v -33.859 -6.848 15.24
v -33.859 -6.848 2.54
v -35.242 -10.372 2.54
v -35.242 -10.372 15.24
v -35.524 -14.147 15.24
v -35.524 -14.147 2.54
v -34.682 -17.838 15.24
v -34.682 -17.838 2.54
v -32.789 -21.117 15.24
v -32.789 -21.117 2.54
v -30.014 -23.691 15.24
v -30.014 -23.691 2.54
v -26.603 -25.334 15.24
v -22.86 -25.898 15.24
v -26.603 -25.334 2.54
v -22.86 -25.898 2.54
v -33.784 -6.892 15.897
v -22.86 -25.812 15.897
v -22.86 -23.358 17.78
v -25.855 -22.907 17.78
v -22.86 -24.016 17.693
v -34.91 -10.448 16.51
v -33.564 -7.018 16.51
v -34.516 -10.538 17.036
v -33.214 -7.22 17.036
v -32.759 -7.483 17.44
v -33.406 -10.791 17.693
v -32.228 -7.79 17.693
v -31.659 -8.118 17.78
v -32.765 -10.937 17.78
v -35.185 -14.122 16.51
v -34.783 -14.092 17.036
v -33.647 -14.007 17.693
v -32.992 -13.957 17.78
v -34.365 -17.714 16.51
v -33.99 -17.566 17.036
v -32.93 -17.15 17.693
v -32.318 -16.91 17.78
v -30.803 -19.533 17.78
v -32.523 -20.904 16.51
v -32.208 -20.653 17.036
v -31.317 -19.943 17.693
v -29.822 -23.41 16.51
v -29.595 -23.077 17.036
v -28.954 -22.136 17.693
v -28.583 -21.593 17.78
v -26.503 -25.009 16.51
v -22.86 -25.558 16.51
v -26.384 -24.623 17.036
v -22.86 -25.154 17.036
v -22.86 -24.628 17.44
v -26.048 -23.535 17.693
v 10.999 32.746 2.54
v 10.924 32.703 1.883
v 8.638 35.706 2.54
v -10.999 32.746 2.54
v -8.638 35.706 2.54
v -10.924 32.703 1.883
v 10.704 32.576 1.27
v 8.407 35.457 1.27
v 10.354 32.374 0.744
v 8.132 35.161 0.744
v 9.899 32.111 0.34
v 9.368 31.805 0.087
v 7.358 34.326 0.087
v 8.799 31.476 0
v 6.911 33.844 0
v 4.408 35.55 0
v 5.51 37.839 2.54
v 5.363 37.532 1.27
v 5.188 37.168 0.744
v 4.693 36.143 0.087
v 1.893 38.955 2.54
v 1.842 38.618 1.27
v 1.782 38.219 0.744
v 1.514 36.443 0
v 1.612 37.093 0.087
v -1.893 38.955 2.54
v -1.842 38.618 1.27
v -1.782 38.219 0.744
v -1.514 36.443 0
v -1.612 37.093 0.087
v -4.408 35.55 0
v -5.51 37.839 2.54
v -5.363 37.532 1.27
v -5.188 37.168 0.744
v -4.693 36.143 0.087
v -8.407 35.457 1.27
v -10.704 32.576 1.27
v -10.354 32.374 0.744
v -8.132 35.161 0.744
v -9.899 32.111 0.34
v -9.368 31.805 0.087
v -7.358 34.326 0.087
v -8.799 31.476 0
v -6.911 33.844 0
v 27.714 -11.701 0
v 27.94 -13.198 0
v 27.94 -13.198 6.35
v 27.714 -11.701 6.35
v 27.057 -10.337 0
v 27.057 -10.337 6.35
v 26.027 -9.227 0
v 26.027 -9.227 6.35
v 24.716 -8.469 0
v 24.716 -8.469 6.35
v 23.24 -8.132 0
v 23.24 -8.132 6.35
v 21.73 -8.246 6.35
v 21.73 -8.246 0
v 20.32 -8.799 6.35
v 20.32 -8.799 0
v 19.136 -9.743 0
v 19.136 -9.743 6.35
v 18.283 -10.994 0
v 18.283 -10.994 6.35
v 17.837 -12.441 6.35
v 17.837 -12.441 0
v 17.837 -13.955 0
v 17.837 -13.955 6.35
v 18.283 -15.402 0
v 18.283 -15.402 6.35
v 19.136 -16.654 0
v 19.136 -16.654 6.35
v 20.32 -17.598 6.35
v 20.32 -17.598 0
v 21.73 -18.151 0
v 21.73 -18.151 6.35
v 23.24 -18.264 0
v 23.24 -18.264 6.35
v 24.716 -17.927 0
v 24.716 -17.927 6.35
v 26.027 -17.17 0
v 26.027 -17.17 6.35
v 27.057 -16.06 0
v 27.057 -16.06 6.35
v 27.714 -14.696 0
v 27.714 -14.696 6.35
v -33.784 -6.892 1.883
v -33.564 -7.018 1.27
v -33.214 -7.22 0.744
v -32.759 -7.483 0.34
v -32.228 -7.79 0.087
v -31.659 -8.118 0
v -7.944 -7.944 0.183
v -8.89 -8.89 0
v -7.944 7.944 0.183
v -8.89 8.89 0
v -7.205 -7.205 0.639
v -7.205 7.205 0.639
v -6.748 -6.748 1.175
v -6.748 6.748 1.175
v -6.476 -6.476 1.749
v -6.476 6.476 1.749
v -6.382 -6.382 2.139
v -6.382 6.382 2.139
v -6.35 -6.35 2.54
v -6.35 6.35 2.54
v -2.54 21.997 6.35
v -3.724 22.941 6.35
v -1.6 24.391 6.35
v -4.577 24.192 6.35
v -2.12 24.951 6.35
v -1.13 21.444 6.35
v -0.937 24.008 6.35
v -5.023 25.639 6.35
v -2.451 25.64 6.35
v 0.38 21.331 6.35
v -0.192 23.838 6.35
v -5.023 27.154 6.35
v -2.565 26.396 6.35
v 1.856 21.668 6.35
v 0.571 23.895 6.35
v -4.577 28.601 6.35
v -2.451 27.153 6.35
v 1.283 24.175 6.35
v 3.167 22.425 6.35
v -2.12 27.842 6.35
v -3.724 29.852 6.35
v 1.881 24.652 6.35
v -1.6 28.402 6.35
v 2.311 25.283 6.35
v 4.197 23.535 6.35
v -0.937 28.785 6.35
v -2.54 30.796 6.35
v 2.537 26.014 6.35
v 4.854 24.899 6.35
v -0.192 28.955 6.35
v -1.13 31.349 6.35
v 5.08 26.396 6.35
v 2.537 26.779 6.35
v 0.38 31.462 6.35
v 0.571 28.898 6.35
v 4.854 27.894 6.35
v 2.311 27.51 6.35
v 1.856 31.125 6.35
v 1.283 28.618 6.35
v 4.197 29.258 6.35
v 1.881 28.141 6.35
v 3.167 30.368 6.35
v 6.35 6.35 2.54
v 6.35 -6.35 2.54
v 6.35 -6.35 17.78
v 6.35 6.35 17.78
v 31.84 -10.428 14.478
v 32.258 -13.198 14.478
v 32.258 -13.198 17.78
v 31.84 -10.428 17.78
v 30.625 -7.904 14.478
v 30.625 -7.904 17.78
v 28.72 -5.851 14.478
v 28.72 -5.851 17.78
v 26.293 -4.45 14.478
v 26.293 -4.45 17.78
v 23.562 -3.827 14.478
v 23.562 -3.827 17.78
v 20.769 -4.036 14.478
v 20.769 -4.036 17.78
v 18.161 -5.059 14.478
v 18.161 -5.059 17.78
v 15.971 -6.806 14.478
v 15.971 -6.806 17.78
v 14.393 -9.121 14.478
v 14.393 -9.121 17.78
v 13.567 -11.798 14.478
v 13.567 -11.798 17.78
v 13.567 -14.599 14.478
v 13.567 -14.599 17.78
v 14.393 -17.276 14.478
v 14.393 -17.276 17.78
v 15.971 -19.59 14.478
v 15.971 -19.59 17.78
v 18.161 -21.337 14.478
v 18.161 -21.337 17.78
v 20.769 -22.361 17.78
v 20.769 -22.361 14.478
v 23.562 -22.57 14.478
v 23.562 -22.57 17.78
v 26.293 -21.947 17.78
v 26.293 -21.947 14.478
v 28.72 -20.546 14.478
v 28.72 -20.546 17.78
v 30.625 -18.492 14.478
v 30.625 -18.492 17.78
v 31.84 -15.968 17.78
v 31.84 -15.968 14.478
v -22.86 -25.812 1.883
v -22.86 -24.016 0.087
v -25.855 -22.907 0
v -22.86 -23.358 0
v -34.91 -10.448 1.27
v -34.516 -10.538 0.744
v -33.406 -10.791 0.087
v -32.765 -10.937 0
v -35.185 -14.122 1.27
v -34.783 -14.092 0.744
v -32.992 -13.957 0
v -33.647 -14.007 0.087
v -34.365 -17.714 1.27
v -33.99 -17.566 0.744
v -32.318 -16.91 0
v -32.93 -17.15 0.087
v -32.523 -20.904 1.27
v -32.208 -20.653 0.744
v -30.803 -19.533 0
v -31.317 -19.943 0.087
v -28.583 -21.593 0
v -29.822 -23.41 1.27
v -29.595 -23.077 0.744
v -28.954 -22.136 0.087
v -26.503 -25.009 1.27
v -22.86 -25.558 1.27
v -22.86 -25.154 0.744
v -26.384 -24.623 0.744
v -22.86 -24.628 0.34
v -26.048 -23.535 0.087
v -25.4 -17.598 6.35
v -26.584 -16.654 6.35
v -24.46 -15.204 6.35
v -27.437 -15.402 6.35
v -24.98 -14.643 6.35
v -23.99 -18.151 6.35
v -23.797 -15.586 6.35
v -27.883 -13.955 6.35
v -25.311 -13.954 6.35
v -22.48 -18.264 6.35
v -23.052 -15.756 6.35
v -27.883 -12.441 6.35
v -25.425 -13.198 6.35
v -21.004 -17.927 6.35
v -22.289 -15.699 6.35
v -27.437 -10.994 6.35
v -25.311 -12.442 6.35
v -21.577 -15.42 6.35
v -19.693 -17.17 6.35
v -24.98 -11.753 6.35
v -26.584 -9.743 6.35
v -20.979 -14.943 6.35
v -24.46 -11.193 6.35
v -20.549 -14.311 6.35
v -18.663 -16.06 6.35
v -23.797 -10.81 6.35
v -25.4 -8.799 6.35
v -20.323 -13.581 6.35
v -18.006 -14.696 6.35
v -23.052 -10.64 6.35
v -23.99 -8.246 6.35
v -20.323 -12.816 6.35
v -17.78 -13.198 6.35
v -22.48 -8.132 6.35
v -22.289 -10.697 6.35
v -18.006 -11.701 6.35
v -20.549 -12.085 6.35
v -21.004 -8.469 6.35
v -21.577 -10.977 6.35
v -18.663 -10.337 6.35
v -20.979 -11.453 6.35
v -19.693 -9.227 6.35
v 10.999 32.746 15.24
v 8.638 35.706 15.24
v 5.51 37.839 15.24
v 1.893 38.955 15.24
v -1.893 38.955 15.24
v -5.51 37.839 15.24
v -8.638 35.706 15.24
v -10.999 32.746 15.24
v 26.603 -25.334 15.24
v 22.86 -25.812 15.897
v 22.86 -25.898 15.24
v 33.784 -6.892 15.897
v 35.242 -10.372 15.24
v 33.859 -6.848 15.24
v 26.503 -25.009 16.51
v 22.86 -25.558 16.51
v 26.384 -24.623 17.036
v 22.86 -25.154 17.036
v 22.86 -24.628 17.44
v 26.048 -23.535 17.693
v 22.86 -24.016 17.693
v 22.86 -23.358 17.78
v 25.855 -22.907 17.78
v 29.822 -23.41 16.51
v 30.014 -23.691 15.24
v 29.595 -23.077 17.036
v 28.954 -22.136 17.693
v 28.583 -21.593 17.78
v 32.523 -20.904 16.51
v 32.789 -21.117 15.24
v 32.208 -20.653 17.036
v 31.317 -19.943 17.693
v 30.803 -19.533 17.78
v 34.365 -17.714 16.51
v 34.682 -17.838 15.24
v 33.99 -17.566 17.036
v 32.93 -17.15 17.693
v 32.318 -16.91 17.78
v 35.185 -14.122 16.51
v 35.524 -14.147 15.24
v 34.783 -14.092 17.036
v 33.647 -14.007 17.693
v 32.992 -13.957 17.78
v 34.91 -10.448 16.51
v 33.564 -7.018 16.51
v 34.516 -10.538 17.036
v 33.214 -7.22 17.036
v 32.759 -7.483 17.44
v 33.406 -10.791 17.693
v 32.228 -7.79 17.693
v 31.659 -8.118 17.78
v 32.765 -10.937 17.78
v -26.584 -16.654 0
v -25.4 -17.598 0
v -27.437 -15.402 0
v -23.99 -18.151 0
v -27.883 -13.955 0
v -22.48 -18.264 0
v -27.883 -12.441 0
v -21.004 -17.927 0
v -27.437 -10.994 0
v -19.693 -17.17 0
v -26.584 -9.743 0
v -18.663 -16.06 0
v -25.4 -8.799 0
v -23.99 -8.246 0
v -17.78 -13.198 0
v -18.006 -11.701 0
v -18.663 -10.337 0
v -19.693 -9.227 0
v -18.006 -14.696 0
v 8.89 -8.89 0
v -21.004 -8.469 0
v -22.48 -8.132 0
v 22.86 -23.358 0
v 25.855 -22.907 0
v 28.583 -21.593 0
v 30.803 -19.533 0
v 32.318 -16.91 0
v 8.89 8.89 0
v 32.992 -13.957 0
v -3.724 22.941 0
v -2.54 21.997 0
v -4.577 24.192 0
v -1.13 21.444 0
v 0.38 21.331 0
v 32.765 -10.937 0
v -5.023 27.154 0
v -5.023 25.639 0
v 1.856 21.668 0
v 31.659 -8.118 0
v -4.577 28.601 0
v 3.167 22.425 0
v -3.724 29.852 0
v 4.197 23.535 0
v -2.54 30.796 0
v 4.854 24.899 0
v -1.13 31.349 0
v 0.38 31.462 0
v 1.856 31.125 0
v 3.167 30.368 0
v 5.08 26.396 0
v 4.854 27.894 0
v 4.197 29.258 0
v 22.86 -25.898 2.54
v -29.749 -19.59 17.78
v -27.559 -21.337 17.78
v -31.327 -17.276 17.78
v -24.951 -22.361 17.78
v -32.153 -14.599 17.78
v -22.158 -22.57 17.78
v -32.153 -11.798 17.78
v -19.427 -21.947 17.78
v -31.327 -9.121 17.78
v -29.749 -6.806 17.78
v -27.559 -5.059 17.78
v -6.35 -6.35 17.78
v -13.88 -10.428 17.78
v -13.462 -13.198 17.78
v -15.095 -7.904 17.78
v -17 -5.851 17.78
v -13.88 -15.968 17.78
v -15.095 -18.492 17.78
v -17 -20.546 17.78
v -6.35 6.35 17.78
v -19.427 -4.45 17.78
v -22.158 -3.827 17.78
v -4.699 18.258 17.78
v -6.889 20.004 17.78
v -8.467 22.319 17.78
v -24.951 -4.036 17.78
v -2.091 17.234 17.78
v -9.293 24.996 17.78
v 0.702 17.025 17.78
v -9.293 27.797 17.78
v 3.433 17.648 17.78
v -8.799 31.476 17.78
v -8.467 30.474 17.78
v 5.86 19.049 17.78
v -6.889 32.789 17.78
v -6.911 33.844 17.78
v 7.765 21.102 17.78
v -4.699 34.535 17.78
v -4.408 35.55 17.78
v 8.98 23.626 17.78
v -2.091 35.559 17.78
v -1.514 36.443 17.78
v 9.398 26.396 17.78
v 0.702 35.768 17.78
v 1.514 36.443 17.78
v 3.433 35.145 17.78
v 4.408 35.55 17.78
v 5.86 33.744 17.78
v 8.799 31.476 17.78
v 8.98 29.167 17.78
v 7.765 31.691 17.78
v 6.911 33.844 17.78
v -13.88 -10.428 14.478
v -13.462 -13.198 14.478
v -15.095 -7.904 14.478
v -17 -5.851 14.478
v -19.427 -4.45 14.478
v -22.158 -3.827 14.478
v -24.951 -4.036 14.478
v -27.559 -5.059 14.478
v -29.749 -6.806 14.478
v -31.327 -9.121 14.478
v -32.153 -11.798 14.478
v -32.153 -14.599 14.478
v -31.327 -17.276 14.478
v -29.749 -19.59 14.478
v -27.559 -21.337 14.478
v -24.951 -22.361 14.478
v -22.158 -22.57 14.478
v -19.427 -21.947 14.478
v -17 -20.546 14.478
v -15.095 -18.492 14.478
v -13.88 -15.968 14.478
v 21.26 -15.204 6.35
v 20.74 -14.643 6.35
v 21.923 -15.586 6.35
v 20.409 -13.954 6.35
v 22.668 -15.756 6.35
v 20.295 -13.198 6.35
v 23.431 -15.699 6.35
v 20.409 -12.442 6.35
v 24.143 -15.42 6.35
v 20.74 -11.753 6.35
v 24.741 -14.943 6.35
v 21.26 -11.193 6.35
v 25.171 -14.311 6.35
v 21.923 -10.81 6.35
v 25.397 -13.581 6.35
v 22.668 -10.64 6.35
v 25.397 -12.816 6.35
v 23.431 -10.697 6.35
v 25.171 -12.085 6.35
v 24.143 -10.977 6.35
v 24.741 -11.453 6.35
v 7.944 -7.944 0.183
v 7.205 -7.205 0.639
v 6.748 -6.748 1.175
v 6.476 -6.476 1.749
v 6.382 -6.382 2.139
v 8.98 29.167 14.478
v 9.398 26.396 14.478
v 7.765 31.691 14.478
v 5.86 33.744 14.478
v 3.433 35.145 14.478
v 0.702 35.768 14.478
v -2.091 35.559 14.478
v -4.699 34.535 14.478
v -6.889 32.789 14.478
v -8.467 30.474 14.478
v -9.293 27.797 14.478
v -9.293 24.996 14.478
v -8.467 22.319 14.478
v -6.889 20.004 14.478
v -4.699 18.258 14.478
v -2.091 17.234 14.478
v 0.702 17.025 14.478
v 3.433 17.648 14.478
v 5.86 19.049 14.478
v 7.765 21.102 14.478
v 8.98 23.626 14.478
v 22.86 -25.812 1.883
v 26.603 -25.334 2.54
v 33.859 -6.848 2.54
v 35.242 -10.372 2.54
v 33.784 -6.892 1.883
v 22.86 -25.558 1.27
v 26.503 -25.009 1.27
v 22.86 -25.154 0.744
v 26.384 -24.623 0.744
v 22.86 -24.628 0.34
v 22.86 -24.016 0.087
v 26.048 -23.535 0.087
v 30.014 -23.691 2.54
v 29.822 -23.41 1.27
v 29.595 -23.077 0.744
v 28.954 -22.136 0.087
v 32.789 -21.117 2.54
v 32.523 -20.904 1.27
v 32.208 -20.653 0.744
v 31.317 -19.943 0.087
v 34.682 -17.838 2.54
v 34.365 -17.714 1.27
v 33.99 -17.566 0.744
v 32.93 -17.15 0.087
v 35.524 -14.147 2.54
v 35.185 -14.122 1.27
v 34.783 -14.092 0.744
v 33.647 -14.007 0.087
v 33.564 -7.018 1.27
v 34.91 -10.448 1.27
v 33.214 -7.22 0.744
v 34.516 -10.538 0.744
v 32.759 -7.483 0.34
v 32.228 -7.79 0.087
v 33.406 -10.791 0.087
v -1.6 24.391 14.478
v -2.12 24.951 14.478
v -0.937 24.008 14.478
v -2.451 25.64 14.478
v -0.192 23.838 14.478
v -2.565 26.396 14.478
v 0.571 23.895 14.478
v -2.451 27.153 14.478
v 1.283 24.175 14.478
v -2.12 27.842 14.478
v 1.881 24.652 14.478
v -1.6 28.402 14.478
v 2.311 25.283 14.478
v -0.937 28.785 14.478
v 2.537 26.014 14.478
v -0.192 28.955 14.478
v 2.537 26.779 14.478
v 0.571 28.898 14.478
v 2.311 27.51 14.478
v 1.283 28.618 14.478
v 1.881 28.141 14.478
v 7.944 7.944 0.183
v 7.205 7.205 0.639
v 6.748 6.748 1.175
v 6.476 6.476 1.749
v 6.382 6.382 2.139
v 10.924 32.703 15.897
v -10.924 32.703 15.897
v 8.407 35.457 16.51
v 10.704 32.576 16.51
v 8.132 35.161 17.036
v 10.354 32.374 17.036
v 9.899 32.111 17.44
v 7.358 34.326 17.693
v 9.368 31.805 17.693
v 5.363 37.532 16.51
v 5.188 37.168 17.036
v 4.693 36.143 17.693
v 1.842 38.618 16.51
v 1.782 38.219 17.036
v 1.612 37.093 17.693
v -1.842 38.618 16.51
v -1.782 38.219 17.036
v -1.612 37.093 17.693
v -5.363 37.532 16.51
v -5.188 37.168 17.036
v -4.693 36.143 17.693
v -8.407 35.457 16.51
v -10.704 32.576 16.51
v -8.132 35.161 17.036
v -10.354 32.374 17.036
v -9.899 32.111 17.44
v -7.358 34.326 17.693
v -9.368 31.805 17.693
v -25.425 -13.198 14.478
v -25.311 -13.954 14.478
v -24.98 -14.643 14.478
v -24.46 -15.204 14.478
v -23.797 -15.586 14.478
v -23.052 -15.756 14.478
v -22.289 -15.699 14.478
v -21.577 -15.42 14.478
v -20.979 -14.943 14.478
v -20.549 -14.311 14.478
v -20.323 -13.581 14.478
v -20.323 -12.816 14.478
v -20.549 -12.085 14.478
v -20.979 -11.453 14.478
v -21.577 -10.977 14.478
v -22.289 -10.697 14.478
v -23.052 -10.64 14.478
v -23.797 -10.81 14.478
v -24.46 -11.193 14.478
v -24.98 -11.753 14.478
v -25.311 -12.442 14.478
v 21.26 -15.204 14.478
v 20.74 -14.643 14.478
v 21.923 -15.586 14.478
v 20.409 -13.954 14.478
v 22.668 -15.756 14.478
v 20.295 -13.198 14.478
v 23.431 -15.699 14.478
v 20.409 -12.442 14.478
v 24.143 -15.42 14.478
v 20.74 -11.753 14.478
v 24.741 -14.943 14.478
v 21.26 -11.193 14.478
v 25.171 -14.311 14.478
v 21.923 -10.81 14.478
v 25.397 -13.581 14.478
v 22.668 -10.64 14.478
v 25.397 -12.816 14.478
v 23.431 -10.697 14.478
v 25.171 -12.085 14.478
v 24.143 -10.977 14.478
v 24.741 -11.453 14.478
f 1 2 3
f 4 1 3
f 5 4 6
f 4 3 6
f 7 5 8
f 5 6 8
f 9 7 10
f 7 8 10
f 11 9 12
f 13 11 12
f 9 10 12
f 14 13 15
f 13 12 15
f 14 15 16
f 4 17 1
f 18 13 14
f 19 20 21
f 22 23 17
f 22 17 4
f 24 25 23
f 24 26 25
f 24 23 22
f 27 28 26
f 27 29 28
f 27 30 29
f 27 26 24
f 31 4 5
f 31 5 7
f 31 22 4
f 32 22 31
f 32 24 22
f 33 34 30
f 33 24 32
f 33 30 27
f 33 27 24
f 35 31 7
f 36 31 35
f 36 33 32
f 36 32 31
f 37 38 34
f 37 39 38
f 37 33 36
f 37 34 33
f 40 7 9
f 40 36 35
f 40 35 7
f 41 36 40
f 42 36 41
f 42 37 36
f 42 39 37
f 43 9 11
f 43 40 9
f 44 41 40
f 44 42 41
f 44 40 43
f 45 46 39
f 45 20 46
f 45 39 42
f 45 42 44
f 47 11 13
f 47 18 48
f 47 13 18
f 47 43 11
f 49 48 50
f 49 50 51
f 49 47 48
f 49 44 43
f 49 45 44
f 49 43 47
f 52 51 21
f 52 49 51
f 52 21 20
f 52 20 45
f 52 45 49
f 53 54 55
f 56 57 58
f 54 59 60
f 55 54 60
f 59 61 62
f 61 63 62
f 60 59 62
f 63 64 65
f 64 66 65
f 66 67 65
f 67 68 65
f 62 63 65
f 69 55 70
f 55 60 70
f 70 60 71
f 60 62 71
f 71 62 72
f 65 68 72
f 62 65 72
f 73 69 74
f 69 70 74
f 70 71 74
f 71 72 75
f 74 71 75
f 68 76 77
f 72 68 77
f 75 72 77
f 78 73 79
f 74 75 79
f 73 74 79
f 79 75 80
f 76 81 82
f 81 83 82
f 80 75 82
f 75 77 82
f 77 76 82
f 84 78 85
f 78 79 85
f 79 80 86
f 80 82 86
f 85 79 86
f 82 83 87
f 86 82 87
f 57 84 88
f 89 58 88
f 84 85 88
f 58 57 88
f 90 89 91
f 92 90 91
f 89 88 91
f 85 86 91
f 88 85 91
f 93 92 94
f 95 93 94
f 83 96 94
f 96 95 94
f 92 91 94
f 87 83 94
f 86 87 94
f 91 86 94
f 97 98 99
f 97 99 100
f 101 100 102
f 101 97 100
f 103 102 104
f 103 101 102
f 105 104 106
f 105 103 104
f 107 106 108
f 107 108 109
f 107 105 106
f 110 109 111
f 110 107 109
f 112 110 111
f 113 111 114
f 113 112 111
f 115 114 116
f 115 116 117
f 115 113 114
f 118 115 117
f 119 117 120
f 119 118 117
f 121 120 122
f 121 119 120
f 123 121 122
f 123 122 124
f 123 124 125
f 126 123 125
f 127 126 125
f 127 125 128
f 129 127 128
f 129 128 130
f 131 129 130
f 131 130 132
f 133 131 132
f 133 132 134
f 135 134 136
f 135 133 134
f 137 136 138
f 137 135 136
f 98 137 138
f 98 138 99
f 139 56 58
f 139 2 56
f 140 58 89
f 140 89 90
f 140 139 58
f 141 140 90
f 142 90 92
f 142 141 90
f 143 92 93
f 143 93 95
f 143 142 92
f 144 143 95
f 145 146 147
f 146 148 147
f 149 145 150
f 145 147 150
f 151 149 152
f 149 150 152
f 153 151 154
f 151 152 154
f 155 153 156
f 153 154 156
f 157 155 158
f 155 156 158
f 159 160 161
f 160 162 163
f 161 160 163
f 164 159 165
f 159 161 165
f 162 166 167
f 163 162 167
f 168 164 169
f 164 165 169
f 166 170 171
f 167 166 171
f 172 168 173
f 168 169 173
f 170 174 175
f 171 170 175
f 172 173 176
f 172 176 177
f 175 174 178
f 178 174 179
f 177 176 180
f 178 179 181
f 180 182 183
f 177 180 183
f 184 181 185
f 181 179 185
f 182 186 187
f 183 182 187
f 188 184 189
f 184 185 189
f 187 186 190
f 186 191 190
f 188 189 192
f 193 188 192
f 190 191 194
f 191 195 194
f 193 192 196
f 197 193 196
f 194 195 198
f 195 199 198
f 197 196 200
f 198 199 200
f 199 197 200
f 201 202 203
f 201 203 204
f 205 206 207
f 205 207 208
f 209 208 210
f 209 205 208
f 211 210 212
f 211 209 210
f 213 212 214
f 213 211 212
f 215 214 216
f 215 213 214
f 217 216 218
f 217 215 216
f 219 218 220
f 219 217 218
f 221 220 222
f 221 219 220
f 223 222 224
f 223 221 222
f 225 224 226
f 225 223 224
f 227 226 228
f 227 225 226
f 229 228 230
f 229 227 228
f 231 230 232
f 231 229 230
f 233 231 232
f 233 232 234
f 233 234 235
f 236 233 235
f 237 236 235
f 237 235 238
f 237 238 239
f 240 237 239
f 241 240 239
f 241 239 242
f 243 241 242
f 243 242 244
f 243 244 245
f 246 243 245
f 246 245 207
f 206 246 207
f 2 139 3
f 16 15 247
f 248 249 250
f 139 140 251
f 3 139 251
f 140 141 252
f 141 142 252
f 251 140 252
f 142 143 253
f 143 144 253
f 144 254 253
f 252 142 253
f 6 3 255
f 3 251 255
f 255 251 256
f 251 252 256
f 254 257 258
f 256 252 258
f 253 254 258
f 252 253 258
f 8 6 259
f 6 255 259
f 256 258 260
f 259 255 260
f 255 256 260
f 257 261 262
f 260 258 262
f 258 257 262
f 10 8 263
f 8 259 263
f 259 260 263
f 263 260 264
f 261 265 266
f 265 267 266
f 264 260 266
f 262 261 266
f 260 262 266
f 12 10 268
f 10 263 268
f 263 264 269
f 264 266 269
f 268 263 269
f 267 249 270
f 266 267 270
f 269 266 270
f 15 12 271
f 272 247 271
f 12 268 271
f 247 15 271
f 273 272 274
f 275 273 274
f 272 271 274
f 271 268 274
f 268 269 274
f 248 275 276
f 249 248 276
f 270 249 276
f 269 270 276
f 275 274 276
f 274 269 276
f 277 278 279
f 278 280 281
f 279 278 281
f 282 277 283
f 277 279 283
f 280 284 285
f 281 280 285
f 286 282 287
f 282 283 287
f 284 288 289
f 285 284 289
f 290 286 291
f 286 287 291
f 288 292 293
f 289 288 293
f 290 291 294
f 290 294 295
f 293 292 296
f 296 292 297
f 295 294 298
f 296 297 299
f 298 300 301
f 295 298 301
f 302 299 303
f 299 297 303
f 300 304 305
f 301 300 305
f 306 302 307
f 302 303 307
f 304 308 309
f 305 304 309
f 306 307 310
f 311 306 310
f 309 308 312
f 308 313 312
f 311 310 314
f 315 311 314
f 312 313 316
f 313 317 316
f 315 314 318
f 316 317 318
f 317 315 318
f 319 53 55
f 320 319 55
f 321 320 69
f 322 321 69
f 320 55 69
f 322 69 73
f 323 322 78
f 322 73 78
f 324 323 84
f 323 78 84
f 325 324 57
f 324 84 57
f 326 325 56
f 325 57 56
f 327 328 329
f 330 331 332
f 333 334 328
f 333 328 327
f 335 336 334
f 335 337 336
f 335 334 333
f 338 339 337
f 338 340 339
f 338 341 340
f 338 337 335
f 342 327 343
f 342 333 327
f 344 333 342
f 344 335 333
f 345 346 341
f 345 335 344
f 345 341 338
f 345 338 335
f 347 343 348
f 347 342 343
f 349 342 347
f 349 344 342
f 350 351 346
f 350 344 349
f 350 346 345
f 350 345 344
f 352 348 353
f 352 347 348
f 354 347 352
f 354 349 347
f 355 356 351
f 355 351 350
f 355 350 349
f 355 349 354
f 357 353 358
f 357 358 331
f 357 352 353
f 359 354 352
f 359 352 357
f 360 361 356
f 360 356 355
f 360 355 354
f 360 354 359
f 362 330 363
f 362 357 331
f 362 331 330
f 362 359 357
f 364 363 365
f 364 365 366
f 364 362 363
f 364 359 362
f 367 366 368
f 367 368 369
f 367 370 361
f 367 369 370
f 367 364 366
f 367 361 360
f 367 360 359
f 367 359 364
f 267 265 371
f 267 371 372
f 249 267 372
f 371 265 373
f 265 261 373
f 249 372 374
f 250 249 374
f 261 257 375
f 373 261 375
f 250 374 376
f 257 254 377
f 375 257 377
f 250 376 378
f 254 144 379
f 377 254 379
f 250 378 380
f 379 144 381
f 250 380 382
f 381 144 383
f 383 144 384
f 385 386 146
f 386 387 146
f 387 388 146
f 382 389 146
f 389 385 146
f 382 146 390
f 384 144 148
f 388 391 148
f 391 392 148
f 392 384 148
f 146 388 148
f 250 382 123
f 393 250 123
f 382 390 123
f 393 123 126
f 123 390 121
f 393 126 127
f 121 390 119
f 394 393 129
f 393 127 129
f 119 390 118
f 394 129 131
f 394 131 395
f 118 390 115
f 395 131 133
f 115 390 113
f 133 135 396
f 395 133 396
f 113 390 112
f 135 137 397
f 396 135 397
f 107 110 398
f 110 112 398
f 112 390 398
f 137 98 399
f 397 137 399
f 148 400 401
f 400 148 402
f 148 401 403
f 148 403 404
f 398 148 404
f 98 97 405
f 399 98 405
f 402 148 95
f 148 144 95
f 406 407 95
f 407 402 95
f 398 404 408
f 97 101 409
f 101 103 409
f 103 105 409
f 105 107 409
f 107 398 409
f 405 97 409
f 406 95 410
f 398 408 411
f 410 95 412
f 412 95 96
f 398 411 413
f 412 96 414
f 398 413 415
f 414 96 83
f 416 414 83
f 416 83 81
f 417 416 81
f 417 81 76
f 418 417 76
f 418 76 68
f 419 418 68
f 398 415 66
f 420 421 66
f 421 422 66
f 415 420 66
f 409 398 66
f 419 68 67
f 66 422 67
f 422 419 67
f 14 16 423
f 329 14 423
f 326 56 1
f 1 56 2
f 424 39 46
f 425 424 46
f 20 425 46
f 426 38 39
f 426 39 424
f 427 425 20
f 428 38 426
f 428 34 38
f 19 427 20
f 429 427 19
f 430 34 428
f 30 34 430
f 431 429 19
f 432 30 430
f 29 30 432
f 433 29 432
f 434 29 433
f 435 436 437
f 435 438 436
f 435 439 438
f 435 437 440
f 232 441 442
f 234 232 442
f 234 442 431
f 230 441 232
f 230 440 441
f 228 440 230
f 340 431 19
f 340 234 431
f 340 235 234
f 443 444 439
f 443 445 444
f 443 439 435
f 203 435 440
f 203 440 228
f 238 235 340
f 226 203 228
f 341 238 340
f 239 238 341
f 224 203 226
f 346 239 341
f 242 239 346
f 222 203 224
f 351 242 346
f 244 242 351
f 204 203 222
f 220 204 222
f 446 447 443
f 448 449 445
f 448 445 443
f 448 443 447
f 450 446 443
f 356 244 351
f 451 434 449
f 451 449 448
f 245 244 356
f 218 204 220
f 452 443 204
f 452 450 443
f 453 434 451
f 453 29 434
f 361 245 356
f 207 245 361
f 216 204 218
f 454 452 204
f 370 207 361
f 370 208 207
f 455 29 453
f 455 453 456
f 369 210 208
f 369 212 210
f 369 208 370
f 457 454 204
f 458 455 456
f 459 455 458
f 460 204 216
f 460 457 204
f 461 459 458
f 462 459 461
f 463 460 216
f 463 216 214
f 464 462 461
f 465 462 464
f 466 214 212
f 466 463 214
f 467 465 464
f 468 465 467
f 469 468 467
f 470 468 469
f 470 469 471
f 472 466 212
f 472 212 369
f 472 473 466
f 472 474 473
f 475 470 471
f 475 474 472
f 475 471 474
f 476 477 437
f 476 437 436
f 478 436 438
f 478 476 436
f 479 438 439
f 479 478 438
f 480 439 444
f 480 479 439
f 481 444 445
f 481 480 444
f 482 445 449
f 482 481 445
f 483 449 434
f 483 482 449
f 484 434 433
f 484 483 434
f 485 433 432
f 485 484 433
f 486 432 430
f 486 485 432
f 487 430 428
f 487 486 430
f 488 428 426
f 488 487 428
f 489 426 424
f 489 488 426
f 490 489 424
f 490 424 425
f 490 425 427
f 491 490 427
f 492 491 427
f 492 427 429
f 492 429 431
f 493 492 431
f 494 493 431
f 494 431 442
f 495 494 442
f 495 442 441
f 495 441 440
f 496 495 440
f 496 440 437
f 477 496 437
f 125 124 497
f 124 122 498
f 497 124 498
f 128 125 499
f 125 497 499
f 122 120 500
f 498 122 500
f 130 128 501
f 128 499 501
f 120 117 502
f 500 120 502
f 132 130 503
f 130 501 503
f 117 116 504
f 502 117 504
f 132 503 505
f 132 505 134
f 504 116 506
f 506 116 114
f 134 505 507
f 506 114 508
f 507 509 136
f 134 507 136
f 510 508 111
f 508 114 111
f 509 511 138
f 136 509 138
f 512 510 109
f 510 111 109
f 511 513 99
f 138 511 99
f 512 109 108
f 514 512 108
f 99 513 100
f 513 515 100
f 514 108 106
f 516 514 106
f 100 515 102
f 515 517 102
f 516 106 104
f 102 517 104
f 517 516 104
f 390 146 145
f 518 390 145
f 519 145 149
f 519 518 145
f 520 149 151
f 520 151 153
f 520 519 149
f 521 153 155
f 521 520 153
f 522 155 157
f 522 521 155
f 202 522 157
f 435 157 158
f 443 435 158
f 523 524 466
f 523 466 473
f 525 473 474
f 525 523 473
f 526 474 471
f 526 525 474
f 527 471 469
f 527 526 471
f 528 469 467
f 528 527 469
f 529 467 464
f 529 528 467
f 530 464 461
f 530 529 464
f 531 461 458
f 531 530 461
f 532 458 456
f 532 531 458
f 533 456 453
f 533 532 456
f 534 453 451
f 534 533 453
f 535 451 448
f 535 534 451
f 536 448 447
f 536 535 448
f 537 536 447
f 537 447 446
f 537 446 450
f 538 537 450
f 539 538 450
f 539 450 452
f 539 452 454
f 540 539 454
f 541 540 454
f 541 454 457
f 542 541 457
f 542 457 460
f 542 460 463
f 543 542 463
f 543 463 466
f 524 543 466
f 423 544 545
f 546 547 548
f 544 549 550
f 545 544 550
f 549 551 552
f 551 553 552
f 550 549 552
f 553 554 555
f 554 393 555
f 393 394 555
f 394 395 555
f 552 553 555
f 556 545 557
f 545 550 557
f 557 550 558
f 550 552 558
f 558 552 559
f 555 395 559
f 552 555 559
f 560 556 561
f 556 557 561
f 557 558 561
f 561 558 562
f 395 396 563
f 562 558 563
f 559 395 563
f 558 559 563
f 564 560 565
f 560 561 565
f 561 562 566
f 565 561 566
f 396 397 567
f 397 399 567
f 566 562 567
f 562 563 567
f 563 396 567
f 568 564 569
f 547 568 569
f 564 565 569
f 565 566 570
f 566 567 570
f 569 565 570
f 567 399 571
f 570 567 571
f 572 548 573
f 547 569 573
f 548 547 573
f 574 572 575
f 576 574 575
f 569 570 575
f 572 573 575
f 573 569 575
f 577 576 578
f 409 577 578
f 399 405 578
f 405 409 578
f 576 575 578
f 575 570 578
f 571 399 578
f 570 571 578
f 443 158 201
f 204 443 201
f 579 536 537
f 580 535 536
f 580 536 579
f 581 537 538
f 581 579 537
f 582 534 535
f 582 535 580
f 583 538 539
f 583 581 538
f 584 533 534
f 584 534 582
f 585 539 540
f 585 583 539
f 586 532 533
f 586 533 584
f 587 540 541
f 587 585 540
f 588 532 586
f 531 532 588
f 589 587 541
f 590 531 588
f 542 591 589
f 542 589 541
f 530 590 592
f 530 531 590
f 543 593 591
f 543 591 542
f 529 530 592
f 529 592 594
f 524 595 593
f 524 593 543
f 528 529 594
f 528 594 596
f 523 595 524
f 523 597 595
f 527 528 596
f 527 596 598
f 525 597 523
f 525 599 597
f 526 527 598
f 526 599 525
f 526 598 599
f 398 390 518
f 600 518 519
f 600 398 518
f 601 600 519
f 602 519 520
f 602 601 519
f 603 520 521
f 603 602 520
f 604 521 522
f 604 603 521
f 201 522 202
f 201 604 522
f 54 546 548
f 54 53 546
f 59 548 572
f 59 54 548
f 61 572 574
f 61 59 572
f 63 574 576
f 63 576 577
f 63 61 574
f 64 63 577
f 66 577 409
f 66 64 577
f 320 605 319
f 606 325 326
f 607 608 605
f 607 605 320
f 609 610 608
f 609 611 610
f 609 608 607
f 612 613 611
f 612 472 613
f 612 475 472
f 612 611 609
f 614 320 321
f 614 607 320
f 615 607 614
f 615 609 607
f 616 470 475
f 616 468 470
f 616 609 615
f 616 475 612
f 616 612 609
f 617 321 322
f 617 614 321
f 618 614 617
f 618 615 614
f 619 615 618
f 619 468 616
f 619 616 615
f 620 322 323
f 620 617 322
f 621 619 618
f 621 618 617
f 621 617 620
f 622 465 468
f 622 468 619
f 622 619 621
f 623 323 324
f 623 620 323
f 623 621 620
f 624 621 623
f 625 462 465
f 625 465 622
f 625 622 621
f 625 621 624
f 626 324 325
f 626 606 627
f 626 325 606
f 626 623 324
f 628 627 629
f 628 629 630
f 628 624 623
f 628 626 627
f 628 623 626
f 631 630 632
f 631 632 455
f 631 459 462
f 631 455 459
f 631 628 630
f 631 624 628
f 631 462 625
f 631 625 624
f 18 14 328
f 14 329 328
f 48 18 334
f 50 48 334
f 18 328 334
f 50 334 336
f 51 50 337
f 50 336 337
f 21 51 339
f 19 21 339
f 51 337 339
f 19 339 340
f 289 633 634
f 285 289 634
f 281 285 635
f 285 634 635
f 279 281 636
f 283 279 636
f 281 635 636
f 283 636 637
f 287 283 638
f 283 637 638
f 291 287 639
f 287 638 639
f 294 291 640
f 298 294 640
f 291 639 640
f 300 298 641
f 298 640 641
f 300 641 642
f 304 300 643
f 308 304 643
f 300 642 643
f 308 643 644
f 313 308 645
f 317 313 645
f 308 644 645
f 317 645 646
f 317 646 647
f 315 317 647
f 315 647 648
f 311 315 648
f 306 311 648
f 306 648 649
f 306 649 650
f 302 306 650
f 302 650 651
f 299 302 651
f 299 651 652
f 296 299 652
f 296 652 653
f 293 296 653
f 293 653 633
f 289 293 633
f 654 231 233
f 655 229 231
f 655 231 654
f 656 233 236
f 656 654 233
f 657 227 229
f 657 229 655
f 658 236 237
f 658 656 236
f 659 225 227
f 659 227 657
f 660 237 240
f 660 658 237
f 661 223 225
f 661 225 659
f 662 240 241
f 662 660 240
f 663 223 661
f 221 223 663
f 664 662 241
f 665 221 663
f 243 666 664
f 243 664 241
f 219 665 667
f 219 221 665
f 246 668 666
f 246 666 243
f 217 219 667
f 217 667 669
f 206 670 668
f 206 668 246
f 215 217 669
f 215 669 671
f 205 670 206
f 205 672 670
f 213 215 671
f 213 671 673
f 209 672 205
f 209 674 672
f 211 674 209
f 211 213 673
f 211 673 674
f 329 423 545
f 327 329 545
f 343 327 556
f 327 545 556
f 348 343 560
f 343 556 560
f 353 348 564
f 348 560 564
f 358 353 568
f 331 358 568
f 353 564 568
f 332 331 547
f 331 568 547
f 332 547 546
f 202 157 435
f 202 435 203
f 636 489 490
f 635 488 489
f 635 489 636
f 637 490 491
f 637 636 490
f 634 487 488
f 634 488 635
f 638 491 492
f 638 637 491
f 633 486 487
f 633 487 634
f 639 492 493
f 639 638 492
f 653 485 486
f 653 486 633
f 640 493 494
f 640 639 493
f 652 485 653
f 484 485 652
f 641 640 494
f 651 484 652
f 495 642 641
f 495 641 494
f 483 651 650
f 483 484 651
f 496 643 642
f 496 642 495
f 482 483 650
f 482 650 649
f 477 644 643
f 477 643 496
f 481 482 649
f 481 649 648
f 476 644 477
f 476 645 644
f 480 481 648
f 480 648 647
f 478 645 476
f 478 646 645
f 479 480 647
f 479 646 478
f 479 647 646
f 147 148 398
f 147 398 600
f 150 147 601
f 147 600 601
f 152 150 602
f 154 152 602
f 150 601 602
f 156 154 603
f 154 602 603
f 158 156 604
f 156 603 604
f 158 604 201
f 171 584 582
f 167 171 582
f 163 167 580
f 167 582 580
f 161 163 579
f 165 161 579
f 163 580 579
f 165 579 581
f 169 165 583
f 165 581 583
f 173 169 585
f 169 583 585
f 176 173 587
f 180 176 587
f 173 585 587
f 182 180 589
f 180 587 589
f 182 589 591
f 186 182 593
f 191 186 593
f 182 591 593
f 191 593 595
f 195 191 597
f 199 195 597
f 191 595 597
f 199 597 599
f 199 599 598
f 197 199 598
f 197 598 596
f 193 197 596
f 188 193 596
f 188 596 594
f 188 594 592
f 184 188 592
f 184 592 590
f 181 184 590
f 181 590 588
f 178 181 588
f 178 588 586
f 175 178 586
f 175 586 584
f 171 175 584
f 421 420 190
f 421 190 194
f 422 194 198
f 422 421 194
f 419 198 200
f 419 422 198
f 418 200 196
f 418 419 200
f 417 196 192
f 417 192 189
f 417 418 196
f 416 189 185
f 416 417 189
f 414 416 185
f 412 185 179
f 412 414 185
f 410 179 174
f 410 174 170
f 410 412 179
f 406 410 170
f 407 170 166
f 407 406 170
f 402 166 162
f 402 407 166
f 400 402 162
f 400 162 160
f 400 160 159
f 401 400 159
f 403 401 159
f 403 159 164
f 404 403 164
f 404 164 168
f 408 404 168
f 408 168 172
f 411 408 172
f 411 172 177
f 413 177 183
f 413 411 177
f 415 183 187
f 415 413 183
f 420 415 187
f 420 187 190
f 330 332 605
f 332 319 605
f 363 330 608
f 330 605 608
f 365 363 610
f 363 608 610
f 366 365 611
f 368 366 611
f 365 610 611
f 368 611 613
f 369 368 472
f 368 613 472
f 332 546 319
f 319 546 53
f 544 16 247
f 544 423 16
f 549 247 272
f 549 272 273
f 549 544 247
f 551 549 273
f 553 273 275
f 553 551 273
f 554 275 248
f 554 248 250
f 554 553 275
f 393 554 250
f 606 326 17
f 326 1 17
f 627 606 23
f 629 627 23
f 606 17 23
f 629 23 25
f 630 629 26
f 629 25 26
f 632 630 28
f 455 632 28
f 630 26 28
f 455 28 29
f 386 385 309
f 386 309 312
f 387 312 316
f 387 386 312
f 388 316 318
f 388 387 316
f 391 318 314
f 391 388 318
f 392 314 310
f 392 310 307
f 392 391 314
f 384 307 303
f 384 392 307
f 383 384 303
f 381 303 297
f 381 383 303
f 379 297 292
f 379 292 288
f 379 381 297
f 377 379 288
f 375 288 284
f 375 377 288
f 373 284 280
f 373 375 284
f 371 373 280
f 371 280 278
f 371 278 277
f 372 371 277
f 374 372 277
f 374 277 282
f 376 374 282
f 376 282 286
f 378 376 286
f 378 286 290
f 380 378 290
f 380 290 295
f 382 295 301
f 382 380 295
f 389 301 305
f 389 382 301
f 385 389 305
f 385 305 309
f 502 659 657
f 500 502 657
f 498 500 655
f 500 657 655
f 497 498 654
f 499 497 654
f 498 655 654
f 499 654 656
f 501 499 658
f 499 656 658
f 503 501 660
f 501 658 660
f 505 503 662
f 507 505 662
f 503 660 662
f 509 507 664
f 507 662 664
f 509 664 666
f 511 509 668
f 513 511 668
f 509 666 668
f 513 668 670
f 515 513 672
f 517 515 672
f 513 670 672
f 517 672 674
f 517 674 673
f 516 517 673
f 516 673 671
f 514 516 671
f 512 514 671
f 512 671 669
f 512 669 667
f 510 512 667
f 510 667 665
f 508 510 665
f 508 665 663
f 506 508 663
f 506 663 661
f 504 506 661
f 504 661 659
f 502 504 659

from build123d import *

# Parameters (mm, degrees)
F0_R          = 9.398
F2_DEPTH      = 17.78
F3_DEPTH      = 14.478
F1_W          = 12.7
F1_H          = 12.7
F4_DEPTH      = 107
F4_DEPTH_BACK = 17.781
F5_D          = 5.1308
F6_R          = 2.54
F7_R          = 2.54
F8_R          = 2.54
F9_R          = 5.08
F10_DEPTH     = 6.35


# Not quite as in the source:
# - an extrude ends at something that could not be found from the text; its depth is read off the source's solid


with BuildPart() as f2:
    # F0 (on Top) → F2 (new body)
    with BuildSketch(Plane.XY):
        with BuildLine():
            ThreePointArc((10.9985226281, 32.7464543073), (0, 39.0964543073), (-10.9985226281, 32.7464543073))
            Line((-10.9985226281, 32.7464543073), (-33.8585226281, -6.8482271537))
            ThreePointArc((-33.8585226281, -6.8482271537), (-33.8585226281, -19.5482271537), (-22.86, -25.8982271537))
            Line((-22.86, -25.8982271537), (22.86, -25.8982271537))
            ThreePointArc((22.86, -25.8982271537), (33.8585226281, -19.5482271537), (33.8585226281, -6.8482271537))
            Line((33.8585226281, -6.8482271537), (10.9985226281, 32.7464543073))
        make_face()
        with Locations((-22.86, -13.1982271537)):
            Circle(F0_R, mode=Mode.SUBTRACT)
        with Locations((22.86, -13.1982271537)):
            Circle(F0_R, mode=Mode.SUBTRACT)
        with Locations((0, 26.3964543073)):
            Circle(F0_R, mode=Mode.SUBTRACT)
    extrude(amount=F2_DEPTH)

    # F0 (on Top) → F3 (join)
    with BuildSketch(Plane.XY):
        with Locations((-22.86, -13.1982271537)):
            Circle(F0_R)
        with Locations((22.86, -13.1982271537)):
            Circle(F0_R)
        with Locations((0, 26.3964543073)):
            Circle(F0_R)
    extrude(amount=F3_DEPTH)

    # F1 (on face) → F4 (cut, two sides)
    with BuildSketch(Plane.XY) as f4_sk:
        Rectangle(F1_W, F1_H)
    extrude(amount=-F4_DEPTH, mode=Mode.SUBTRACT)
    extrude(f4_sk.sketch, amount=F4_DEPTH_BACK, mode=Mode.SUBTRACT)

    # F5 (through all)
    with Locations(Plane(origin=(0, 0, 0), x_dir=(1, 0, 0), z_dir=(0, 0, -1))):
        with Locations((-22.86, 13.1982271537), (22.86, 13.1982271537), (0, -26.3964543073)):
            Hole(F5_D / 2)

    # F6
    f6_edges = [f2.edges().sort_by_distance(p)[0] for p in [
        (-22.428523, 12.949114, 17.78),
    ]]
    fillet(f6_edges, radius=F6_R)

    # F7
    f7_edges = [f2.edges().sort_by_distance(p)[0] for p in [
        (22.428523, 12.949114, 0),
    ]]
    fillet(f7_edges, radius=F7_R)

    # F8
    f8_edges = [f2.edges().sort_by_distance(p)[0] for p in [
        (6.35, 0, 0),
        (0, -6.35, 0),
        (0, 6.35, 0),
        (-6.35, 0, 0),
    ]]
    fillet(f8_edges, radius=F8_R)

    # F9 (on face) → F10 (cut)
    with BuildSketch(Plane.XY):
        with Locations((22.86, -13.1982271537)):
            Circle(F9_R)
        with Locations((0, 26.3964543073)):
            Circle(F9_R)
        with Locations((-22.86, -13.1982271537)):
            Circle(F9_R)
    extrude(amount=F10_DEPTH, mode=Mode.SUBTRACT)


solid = f2.part
